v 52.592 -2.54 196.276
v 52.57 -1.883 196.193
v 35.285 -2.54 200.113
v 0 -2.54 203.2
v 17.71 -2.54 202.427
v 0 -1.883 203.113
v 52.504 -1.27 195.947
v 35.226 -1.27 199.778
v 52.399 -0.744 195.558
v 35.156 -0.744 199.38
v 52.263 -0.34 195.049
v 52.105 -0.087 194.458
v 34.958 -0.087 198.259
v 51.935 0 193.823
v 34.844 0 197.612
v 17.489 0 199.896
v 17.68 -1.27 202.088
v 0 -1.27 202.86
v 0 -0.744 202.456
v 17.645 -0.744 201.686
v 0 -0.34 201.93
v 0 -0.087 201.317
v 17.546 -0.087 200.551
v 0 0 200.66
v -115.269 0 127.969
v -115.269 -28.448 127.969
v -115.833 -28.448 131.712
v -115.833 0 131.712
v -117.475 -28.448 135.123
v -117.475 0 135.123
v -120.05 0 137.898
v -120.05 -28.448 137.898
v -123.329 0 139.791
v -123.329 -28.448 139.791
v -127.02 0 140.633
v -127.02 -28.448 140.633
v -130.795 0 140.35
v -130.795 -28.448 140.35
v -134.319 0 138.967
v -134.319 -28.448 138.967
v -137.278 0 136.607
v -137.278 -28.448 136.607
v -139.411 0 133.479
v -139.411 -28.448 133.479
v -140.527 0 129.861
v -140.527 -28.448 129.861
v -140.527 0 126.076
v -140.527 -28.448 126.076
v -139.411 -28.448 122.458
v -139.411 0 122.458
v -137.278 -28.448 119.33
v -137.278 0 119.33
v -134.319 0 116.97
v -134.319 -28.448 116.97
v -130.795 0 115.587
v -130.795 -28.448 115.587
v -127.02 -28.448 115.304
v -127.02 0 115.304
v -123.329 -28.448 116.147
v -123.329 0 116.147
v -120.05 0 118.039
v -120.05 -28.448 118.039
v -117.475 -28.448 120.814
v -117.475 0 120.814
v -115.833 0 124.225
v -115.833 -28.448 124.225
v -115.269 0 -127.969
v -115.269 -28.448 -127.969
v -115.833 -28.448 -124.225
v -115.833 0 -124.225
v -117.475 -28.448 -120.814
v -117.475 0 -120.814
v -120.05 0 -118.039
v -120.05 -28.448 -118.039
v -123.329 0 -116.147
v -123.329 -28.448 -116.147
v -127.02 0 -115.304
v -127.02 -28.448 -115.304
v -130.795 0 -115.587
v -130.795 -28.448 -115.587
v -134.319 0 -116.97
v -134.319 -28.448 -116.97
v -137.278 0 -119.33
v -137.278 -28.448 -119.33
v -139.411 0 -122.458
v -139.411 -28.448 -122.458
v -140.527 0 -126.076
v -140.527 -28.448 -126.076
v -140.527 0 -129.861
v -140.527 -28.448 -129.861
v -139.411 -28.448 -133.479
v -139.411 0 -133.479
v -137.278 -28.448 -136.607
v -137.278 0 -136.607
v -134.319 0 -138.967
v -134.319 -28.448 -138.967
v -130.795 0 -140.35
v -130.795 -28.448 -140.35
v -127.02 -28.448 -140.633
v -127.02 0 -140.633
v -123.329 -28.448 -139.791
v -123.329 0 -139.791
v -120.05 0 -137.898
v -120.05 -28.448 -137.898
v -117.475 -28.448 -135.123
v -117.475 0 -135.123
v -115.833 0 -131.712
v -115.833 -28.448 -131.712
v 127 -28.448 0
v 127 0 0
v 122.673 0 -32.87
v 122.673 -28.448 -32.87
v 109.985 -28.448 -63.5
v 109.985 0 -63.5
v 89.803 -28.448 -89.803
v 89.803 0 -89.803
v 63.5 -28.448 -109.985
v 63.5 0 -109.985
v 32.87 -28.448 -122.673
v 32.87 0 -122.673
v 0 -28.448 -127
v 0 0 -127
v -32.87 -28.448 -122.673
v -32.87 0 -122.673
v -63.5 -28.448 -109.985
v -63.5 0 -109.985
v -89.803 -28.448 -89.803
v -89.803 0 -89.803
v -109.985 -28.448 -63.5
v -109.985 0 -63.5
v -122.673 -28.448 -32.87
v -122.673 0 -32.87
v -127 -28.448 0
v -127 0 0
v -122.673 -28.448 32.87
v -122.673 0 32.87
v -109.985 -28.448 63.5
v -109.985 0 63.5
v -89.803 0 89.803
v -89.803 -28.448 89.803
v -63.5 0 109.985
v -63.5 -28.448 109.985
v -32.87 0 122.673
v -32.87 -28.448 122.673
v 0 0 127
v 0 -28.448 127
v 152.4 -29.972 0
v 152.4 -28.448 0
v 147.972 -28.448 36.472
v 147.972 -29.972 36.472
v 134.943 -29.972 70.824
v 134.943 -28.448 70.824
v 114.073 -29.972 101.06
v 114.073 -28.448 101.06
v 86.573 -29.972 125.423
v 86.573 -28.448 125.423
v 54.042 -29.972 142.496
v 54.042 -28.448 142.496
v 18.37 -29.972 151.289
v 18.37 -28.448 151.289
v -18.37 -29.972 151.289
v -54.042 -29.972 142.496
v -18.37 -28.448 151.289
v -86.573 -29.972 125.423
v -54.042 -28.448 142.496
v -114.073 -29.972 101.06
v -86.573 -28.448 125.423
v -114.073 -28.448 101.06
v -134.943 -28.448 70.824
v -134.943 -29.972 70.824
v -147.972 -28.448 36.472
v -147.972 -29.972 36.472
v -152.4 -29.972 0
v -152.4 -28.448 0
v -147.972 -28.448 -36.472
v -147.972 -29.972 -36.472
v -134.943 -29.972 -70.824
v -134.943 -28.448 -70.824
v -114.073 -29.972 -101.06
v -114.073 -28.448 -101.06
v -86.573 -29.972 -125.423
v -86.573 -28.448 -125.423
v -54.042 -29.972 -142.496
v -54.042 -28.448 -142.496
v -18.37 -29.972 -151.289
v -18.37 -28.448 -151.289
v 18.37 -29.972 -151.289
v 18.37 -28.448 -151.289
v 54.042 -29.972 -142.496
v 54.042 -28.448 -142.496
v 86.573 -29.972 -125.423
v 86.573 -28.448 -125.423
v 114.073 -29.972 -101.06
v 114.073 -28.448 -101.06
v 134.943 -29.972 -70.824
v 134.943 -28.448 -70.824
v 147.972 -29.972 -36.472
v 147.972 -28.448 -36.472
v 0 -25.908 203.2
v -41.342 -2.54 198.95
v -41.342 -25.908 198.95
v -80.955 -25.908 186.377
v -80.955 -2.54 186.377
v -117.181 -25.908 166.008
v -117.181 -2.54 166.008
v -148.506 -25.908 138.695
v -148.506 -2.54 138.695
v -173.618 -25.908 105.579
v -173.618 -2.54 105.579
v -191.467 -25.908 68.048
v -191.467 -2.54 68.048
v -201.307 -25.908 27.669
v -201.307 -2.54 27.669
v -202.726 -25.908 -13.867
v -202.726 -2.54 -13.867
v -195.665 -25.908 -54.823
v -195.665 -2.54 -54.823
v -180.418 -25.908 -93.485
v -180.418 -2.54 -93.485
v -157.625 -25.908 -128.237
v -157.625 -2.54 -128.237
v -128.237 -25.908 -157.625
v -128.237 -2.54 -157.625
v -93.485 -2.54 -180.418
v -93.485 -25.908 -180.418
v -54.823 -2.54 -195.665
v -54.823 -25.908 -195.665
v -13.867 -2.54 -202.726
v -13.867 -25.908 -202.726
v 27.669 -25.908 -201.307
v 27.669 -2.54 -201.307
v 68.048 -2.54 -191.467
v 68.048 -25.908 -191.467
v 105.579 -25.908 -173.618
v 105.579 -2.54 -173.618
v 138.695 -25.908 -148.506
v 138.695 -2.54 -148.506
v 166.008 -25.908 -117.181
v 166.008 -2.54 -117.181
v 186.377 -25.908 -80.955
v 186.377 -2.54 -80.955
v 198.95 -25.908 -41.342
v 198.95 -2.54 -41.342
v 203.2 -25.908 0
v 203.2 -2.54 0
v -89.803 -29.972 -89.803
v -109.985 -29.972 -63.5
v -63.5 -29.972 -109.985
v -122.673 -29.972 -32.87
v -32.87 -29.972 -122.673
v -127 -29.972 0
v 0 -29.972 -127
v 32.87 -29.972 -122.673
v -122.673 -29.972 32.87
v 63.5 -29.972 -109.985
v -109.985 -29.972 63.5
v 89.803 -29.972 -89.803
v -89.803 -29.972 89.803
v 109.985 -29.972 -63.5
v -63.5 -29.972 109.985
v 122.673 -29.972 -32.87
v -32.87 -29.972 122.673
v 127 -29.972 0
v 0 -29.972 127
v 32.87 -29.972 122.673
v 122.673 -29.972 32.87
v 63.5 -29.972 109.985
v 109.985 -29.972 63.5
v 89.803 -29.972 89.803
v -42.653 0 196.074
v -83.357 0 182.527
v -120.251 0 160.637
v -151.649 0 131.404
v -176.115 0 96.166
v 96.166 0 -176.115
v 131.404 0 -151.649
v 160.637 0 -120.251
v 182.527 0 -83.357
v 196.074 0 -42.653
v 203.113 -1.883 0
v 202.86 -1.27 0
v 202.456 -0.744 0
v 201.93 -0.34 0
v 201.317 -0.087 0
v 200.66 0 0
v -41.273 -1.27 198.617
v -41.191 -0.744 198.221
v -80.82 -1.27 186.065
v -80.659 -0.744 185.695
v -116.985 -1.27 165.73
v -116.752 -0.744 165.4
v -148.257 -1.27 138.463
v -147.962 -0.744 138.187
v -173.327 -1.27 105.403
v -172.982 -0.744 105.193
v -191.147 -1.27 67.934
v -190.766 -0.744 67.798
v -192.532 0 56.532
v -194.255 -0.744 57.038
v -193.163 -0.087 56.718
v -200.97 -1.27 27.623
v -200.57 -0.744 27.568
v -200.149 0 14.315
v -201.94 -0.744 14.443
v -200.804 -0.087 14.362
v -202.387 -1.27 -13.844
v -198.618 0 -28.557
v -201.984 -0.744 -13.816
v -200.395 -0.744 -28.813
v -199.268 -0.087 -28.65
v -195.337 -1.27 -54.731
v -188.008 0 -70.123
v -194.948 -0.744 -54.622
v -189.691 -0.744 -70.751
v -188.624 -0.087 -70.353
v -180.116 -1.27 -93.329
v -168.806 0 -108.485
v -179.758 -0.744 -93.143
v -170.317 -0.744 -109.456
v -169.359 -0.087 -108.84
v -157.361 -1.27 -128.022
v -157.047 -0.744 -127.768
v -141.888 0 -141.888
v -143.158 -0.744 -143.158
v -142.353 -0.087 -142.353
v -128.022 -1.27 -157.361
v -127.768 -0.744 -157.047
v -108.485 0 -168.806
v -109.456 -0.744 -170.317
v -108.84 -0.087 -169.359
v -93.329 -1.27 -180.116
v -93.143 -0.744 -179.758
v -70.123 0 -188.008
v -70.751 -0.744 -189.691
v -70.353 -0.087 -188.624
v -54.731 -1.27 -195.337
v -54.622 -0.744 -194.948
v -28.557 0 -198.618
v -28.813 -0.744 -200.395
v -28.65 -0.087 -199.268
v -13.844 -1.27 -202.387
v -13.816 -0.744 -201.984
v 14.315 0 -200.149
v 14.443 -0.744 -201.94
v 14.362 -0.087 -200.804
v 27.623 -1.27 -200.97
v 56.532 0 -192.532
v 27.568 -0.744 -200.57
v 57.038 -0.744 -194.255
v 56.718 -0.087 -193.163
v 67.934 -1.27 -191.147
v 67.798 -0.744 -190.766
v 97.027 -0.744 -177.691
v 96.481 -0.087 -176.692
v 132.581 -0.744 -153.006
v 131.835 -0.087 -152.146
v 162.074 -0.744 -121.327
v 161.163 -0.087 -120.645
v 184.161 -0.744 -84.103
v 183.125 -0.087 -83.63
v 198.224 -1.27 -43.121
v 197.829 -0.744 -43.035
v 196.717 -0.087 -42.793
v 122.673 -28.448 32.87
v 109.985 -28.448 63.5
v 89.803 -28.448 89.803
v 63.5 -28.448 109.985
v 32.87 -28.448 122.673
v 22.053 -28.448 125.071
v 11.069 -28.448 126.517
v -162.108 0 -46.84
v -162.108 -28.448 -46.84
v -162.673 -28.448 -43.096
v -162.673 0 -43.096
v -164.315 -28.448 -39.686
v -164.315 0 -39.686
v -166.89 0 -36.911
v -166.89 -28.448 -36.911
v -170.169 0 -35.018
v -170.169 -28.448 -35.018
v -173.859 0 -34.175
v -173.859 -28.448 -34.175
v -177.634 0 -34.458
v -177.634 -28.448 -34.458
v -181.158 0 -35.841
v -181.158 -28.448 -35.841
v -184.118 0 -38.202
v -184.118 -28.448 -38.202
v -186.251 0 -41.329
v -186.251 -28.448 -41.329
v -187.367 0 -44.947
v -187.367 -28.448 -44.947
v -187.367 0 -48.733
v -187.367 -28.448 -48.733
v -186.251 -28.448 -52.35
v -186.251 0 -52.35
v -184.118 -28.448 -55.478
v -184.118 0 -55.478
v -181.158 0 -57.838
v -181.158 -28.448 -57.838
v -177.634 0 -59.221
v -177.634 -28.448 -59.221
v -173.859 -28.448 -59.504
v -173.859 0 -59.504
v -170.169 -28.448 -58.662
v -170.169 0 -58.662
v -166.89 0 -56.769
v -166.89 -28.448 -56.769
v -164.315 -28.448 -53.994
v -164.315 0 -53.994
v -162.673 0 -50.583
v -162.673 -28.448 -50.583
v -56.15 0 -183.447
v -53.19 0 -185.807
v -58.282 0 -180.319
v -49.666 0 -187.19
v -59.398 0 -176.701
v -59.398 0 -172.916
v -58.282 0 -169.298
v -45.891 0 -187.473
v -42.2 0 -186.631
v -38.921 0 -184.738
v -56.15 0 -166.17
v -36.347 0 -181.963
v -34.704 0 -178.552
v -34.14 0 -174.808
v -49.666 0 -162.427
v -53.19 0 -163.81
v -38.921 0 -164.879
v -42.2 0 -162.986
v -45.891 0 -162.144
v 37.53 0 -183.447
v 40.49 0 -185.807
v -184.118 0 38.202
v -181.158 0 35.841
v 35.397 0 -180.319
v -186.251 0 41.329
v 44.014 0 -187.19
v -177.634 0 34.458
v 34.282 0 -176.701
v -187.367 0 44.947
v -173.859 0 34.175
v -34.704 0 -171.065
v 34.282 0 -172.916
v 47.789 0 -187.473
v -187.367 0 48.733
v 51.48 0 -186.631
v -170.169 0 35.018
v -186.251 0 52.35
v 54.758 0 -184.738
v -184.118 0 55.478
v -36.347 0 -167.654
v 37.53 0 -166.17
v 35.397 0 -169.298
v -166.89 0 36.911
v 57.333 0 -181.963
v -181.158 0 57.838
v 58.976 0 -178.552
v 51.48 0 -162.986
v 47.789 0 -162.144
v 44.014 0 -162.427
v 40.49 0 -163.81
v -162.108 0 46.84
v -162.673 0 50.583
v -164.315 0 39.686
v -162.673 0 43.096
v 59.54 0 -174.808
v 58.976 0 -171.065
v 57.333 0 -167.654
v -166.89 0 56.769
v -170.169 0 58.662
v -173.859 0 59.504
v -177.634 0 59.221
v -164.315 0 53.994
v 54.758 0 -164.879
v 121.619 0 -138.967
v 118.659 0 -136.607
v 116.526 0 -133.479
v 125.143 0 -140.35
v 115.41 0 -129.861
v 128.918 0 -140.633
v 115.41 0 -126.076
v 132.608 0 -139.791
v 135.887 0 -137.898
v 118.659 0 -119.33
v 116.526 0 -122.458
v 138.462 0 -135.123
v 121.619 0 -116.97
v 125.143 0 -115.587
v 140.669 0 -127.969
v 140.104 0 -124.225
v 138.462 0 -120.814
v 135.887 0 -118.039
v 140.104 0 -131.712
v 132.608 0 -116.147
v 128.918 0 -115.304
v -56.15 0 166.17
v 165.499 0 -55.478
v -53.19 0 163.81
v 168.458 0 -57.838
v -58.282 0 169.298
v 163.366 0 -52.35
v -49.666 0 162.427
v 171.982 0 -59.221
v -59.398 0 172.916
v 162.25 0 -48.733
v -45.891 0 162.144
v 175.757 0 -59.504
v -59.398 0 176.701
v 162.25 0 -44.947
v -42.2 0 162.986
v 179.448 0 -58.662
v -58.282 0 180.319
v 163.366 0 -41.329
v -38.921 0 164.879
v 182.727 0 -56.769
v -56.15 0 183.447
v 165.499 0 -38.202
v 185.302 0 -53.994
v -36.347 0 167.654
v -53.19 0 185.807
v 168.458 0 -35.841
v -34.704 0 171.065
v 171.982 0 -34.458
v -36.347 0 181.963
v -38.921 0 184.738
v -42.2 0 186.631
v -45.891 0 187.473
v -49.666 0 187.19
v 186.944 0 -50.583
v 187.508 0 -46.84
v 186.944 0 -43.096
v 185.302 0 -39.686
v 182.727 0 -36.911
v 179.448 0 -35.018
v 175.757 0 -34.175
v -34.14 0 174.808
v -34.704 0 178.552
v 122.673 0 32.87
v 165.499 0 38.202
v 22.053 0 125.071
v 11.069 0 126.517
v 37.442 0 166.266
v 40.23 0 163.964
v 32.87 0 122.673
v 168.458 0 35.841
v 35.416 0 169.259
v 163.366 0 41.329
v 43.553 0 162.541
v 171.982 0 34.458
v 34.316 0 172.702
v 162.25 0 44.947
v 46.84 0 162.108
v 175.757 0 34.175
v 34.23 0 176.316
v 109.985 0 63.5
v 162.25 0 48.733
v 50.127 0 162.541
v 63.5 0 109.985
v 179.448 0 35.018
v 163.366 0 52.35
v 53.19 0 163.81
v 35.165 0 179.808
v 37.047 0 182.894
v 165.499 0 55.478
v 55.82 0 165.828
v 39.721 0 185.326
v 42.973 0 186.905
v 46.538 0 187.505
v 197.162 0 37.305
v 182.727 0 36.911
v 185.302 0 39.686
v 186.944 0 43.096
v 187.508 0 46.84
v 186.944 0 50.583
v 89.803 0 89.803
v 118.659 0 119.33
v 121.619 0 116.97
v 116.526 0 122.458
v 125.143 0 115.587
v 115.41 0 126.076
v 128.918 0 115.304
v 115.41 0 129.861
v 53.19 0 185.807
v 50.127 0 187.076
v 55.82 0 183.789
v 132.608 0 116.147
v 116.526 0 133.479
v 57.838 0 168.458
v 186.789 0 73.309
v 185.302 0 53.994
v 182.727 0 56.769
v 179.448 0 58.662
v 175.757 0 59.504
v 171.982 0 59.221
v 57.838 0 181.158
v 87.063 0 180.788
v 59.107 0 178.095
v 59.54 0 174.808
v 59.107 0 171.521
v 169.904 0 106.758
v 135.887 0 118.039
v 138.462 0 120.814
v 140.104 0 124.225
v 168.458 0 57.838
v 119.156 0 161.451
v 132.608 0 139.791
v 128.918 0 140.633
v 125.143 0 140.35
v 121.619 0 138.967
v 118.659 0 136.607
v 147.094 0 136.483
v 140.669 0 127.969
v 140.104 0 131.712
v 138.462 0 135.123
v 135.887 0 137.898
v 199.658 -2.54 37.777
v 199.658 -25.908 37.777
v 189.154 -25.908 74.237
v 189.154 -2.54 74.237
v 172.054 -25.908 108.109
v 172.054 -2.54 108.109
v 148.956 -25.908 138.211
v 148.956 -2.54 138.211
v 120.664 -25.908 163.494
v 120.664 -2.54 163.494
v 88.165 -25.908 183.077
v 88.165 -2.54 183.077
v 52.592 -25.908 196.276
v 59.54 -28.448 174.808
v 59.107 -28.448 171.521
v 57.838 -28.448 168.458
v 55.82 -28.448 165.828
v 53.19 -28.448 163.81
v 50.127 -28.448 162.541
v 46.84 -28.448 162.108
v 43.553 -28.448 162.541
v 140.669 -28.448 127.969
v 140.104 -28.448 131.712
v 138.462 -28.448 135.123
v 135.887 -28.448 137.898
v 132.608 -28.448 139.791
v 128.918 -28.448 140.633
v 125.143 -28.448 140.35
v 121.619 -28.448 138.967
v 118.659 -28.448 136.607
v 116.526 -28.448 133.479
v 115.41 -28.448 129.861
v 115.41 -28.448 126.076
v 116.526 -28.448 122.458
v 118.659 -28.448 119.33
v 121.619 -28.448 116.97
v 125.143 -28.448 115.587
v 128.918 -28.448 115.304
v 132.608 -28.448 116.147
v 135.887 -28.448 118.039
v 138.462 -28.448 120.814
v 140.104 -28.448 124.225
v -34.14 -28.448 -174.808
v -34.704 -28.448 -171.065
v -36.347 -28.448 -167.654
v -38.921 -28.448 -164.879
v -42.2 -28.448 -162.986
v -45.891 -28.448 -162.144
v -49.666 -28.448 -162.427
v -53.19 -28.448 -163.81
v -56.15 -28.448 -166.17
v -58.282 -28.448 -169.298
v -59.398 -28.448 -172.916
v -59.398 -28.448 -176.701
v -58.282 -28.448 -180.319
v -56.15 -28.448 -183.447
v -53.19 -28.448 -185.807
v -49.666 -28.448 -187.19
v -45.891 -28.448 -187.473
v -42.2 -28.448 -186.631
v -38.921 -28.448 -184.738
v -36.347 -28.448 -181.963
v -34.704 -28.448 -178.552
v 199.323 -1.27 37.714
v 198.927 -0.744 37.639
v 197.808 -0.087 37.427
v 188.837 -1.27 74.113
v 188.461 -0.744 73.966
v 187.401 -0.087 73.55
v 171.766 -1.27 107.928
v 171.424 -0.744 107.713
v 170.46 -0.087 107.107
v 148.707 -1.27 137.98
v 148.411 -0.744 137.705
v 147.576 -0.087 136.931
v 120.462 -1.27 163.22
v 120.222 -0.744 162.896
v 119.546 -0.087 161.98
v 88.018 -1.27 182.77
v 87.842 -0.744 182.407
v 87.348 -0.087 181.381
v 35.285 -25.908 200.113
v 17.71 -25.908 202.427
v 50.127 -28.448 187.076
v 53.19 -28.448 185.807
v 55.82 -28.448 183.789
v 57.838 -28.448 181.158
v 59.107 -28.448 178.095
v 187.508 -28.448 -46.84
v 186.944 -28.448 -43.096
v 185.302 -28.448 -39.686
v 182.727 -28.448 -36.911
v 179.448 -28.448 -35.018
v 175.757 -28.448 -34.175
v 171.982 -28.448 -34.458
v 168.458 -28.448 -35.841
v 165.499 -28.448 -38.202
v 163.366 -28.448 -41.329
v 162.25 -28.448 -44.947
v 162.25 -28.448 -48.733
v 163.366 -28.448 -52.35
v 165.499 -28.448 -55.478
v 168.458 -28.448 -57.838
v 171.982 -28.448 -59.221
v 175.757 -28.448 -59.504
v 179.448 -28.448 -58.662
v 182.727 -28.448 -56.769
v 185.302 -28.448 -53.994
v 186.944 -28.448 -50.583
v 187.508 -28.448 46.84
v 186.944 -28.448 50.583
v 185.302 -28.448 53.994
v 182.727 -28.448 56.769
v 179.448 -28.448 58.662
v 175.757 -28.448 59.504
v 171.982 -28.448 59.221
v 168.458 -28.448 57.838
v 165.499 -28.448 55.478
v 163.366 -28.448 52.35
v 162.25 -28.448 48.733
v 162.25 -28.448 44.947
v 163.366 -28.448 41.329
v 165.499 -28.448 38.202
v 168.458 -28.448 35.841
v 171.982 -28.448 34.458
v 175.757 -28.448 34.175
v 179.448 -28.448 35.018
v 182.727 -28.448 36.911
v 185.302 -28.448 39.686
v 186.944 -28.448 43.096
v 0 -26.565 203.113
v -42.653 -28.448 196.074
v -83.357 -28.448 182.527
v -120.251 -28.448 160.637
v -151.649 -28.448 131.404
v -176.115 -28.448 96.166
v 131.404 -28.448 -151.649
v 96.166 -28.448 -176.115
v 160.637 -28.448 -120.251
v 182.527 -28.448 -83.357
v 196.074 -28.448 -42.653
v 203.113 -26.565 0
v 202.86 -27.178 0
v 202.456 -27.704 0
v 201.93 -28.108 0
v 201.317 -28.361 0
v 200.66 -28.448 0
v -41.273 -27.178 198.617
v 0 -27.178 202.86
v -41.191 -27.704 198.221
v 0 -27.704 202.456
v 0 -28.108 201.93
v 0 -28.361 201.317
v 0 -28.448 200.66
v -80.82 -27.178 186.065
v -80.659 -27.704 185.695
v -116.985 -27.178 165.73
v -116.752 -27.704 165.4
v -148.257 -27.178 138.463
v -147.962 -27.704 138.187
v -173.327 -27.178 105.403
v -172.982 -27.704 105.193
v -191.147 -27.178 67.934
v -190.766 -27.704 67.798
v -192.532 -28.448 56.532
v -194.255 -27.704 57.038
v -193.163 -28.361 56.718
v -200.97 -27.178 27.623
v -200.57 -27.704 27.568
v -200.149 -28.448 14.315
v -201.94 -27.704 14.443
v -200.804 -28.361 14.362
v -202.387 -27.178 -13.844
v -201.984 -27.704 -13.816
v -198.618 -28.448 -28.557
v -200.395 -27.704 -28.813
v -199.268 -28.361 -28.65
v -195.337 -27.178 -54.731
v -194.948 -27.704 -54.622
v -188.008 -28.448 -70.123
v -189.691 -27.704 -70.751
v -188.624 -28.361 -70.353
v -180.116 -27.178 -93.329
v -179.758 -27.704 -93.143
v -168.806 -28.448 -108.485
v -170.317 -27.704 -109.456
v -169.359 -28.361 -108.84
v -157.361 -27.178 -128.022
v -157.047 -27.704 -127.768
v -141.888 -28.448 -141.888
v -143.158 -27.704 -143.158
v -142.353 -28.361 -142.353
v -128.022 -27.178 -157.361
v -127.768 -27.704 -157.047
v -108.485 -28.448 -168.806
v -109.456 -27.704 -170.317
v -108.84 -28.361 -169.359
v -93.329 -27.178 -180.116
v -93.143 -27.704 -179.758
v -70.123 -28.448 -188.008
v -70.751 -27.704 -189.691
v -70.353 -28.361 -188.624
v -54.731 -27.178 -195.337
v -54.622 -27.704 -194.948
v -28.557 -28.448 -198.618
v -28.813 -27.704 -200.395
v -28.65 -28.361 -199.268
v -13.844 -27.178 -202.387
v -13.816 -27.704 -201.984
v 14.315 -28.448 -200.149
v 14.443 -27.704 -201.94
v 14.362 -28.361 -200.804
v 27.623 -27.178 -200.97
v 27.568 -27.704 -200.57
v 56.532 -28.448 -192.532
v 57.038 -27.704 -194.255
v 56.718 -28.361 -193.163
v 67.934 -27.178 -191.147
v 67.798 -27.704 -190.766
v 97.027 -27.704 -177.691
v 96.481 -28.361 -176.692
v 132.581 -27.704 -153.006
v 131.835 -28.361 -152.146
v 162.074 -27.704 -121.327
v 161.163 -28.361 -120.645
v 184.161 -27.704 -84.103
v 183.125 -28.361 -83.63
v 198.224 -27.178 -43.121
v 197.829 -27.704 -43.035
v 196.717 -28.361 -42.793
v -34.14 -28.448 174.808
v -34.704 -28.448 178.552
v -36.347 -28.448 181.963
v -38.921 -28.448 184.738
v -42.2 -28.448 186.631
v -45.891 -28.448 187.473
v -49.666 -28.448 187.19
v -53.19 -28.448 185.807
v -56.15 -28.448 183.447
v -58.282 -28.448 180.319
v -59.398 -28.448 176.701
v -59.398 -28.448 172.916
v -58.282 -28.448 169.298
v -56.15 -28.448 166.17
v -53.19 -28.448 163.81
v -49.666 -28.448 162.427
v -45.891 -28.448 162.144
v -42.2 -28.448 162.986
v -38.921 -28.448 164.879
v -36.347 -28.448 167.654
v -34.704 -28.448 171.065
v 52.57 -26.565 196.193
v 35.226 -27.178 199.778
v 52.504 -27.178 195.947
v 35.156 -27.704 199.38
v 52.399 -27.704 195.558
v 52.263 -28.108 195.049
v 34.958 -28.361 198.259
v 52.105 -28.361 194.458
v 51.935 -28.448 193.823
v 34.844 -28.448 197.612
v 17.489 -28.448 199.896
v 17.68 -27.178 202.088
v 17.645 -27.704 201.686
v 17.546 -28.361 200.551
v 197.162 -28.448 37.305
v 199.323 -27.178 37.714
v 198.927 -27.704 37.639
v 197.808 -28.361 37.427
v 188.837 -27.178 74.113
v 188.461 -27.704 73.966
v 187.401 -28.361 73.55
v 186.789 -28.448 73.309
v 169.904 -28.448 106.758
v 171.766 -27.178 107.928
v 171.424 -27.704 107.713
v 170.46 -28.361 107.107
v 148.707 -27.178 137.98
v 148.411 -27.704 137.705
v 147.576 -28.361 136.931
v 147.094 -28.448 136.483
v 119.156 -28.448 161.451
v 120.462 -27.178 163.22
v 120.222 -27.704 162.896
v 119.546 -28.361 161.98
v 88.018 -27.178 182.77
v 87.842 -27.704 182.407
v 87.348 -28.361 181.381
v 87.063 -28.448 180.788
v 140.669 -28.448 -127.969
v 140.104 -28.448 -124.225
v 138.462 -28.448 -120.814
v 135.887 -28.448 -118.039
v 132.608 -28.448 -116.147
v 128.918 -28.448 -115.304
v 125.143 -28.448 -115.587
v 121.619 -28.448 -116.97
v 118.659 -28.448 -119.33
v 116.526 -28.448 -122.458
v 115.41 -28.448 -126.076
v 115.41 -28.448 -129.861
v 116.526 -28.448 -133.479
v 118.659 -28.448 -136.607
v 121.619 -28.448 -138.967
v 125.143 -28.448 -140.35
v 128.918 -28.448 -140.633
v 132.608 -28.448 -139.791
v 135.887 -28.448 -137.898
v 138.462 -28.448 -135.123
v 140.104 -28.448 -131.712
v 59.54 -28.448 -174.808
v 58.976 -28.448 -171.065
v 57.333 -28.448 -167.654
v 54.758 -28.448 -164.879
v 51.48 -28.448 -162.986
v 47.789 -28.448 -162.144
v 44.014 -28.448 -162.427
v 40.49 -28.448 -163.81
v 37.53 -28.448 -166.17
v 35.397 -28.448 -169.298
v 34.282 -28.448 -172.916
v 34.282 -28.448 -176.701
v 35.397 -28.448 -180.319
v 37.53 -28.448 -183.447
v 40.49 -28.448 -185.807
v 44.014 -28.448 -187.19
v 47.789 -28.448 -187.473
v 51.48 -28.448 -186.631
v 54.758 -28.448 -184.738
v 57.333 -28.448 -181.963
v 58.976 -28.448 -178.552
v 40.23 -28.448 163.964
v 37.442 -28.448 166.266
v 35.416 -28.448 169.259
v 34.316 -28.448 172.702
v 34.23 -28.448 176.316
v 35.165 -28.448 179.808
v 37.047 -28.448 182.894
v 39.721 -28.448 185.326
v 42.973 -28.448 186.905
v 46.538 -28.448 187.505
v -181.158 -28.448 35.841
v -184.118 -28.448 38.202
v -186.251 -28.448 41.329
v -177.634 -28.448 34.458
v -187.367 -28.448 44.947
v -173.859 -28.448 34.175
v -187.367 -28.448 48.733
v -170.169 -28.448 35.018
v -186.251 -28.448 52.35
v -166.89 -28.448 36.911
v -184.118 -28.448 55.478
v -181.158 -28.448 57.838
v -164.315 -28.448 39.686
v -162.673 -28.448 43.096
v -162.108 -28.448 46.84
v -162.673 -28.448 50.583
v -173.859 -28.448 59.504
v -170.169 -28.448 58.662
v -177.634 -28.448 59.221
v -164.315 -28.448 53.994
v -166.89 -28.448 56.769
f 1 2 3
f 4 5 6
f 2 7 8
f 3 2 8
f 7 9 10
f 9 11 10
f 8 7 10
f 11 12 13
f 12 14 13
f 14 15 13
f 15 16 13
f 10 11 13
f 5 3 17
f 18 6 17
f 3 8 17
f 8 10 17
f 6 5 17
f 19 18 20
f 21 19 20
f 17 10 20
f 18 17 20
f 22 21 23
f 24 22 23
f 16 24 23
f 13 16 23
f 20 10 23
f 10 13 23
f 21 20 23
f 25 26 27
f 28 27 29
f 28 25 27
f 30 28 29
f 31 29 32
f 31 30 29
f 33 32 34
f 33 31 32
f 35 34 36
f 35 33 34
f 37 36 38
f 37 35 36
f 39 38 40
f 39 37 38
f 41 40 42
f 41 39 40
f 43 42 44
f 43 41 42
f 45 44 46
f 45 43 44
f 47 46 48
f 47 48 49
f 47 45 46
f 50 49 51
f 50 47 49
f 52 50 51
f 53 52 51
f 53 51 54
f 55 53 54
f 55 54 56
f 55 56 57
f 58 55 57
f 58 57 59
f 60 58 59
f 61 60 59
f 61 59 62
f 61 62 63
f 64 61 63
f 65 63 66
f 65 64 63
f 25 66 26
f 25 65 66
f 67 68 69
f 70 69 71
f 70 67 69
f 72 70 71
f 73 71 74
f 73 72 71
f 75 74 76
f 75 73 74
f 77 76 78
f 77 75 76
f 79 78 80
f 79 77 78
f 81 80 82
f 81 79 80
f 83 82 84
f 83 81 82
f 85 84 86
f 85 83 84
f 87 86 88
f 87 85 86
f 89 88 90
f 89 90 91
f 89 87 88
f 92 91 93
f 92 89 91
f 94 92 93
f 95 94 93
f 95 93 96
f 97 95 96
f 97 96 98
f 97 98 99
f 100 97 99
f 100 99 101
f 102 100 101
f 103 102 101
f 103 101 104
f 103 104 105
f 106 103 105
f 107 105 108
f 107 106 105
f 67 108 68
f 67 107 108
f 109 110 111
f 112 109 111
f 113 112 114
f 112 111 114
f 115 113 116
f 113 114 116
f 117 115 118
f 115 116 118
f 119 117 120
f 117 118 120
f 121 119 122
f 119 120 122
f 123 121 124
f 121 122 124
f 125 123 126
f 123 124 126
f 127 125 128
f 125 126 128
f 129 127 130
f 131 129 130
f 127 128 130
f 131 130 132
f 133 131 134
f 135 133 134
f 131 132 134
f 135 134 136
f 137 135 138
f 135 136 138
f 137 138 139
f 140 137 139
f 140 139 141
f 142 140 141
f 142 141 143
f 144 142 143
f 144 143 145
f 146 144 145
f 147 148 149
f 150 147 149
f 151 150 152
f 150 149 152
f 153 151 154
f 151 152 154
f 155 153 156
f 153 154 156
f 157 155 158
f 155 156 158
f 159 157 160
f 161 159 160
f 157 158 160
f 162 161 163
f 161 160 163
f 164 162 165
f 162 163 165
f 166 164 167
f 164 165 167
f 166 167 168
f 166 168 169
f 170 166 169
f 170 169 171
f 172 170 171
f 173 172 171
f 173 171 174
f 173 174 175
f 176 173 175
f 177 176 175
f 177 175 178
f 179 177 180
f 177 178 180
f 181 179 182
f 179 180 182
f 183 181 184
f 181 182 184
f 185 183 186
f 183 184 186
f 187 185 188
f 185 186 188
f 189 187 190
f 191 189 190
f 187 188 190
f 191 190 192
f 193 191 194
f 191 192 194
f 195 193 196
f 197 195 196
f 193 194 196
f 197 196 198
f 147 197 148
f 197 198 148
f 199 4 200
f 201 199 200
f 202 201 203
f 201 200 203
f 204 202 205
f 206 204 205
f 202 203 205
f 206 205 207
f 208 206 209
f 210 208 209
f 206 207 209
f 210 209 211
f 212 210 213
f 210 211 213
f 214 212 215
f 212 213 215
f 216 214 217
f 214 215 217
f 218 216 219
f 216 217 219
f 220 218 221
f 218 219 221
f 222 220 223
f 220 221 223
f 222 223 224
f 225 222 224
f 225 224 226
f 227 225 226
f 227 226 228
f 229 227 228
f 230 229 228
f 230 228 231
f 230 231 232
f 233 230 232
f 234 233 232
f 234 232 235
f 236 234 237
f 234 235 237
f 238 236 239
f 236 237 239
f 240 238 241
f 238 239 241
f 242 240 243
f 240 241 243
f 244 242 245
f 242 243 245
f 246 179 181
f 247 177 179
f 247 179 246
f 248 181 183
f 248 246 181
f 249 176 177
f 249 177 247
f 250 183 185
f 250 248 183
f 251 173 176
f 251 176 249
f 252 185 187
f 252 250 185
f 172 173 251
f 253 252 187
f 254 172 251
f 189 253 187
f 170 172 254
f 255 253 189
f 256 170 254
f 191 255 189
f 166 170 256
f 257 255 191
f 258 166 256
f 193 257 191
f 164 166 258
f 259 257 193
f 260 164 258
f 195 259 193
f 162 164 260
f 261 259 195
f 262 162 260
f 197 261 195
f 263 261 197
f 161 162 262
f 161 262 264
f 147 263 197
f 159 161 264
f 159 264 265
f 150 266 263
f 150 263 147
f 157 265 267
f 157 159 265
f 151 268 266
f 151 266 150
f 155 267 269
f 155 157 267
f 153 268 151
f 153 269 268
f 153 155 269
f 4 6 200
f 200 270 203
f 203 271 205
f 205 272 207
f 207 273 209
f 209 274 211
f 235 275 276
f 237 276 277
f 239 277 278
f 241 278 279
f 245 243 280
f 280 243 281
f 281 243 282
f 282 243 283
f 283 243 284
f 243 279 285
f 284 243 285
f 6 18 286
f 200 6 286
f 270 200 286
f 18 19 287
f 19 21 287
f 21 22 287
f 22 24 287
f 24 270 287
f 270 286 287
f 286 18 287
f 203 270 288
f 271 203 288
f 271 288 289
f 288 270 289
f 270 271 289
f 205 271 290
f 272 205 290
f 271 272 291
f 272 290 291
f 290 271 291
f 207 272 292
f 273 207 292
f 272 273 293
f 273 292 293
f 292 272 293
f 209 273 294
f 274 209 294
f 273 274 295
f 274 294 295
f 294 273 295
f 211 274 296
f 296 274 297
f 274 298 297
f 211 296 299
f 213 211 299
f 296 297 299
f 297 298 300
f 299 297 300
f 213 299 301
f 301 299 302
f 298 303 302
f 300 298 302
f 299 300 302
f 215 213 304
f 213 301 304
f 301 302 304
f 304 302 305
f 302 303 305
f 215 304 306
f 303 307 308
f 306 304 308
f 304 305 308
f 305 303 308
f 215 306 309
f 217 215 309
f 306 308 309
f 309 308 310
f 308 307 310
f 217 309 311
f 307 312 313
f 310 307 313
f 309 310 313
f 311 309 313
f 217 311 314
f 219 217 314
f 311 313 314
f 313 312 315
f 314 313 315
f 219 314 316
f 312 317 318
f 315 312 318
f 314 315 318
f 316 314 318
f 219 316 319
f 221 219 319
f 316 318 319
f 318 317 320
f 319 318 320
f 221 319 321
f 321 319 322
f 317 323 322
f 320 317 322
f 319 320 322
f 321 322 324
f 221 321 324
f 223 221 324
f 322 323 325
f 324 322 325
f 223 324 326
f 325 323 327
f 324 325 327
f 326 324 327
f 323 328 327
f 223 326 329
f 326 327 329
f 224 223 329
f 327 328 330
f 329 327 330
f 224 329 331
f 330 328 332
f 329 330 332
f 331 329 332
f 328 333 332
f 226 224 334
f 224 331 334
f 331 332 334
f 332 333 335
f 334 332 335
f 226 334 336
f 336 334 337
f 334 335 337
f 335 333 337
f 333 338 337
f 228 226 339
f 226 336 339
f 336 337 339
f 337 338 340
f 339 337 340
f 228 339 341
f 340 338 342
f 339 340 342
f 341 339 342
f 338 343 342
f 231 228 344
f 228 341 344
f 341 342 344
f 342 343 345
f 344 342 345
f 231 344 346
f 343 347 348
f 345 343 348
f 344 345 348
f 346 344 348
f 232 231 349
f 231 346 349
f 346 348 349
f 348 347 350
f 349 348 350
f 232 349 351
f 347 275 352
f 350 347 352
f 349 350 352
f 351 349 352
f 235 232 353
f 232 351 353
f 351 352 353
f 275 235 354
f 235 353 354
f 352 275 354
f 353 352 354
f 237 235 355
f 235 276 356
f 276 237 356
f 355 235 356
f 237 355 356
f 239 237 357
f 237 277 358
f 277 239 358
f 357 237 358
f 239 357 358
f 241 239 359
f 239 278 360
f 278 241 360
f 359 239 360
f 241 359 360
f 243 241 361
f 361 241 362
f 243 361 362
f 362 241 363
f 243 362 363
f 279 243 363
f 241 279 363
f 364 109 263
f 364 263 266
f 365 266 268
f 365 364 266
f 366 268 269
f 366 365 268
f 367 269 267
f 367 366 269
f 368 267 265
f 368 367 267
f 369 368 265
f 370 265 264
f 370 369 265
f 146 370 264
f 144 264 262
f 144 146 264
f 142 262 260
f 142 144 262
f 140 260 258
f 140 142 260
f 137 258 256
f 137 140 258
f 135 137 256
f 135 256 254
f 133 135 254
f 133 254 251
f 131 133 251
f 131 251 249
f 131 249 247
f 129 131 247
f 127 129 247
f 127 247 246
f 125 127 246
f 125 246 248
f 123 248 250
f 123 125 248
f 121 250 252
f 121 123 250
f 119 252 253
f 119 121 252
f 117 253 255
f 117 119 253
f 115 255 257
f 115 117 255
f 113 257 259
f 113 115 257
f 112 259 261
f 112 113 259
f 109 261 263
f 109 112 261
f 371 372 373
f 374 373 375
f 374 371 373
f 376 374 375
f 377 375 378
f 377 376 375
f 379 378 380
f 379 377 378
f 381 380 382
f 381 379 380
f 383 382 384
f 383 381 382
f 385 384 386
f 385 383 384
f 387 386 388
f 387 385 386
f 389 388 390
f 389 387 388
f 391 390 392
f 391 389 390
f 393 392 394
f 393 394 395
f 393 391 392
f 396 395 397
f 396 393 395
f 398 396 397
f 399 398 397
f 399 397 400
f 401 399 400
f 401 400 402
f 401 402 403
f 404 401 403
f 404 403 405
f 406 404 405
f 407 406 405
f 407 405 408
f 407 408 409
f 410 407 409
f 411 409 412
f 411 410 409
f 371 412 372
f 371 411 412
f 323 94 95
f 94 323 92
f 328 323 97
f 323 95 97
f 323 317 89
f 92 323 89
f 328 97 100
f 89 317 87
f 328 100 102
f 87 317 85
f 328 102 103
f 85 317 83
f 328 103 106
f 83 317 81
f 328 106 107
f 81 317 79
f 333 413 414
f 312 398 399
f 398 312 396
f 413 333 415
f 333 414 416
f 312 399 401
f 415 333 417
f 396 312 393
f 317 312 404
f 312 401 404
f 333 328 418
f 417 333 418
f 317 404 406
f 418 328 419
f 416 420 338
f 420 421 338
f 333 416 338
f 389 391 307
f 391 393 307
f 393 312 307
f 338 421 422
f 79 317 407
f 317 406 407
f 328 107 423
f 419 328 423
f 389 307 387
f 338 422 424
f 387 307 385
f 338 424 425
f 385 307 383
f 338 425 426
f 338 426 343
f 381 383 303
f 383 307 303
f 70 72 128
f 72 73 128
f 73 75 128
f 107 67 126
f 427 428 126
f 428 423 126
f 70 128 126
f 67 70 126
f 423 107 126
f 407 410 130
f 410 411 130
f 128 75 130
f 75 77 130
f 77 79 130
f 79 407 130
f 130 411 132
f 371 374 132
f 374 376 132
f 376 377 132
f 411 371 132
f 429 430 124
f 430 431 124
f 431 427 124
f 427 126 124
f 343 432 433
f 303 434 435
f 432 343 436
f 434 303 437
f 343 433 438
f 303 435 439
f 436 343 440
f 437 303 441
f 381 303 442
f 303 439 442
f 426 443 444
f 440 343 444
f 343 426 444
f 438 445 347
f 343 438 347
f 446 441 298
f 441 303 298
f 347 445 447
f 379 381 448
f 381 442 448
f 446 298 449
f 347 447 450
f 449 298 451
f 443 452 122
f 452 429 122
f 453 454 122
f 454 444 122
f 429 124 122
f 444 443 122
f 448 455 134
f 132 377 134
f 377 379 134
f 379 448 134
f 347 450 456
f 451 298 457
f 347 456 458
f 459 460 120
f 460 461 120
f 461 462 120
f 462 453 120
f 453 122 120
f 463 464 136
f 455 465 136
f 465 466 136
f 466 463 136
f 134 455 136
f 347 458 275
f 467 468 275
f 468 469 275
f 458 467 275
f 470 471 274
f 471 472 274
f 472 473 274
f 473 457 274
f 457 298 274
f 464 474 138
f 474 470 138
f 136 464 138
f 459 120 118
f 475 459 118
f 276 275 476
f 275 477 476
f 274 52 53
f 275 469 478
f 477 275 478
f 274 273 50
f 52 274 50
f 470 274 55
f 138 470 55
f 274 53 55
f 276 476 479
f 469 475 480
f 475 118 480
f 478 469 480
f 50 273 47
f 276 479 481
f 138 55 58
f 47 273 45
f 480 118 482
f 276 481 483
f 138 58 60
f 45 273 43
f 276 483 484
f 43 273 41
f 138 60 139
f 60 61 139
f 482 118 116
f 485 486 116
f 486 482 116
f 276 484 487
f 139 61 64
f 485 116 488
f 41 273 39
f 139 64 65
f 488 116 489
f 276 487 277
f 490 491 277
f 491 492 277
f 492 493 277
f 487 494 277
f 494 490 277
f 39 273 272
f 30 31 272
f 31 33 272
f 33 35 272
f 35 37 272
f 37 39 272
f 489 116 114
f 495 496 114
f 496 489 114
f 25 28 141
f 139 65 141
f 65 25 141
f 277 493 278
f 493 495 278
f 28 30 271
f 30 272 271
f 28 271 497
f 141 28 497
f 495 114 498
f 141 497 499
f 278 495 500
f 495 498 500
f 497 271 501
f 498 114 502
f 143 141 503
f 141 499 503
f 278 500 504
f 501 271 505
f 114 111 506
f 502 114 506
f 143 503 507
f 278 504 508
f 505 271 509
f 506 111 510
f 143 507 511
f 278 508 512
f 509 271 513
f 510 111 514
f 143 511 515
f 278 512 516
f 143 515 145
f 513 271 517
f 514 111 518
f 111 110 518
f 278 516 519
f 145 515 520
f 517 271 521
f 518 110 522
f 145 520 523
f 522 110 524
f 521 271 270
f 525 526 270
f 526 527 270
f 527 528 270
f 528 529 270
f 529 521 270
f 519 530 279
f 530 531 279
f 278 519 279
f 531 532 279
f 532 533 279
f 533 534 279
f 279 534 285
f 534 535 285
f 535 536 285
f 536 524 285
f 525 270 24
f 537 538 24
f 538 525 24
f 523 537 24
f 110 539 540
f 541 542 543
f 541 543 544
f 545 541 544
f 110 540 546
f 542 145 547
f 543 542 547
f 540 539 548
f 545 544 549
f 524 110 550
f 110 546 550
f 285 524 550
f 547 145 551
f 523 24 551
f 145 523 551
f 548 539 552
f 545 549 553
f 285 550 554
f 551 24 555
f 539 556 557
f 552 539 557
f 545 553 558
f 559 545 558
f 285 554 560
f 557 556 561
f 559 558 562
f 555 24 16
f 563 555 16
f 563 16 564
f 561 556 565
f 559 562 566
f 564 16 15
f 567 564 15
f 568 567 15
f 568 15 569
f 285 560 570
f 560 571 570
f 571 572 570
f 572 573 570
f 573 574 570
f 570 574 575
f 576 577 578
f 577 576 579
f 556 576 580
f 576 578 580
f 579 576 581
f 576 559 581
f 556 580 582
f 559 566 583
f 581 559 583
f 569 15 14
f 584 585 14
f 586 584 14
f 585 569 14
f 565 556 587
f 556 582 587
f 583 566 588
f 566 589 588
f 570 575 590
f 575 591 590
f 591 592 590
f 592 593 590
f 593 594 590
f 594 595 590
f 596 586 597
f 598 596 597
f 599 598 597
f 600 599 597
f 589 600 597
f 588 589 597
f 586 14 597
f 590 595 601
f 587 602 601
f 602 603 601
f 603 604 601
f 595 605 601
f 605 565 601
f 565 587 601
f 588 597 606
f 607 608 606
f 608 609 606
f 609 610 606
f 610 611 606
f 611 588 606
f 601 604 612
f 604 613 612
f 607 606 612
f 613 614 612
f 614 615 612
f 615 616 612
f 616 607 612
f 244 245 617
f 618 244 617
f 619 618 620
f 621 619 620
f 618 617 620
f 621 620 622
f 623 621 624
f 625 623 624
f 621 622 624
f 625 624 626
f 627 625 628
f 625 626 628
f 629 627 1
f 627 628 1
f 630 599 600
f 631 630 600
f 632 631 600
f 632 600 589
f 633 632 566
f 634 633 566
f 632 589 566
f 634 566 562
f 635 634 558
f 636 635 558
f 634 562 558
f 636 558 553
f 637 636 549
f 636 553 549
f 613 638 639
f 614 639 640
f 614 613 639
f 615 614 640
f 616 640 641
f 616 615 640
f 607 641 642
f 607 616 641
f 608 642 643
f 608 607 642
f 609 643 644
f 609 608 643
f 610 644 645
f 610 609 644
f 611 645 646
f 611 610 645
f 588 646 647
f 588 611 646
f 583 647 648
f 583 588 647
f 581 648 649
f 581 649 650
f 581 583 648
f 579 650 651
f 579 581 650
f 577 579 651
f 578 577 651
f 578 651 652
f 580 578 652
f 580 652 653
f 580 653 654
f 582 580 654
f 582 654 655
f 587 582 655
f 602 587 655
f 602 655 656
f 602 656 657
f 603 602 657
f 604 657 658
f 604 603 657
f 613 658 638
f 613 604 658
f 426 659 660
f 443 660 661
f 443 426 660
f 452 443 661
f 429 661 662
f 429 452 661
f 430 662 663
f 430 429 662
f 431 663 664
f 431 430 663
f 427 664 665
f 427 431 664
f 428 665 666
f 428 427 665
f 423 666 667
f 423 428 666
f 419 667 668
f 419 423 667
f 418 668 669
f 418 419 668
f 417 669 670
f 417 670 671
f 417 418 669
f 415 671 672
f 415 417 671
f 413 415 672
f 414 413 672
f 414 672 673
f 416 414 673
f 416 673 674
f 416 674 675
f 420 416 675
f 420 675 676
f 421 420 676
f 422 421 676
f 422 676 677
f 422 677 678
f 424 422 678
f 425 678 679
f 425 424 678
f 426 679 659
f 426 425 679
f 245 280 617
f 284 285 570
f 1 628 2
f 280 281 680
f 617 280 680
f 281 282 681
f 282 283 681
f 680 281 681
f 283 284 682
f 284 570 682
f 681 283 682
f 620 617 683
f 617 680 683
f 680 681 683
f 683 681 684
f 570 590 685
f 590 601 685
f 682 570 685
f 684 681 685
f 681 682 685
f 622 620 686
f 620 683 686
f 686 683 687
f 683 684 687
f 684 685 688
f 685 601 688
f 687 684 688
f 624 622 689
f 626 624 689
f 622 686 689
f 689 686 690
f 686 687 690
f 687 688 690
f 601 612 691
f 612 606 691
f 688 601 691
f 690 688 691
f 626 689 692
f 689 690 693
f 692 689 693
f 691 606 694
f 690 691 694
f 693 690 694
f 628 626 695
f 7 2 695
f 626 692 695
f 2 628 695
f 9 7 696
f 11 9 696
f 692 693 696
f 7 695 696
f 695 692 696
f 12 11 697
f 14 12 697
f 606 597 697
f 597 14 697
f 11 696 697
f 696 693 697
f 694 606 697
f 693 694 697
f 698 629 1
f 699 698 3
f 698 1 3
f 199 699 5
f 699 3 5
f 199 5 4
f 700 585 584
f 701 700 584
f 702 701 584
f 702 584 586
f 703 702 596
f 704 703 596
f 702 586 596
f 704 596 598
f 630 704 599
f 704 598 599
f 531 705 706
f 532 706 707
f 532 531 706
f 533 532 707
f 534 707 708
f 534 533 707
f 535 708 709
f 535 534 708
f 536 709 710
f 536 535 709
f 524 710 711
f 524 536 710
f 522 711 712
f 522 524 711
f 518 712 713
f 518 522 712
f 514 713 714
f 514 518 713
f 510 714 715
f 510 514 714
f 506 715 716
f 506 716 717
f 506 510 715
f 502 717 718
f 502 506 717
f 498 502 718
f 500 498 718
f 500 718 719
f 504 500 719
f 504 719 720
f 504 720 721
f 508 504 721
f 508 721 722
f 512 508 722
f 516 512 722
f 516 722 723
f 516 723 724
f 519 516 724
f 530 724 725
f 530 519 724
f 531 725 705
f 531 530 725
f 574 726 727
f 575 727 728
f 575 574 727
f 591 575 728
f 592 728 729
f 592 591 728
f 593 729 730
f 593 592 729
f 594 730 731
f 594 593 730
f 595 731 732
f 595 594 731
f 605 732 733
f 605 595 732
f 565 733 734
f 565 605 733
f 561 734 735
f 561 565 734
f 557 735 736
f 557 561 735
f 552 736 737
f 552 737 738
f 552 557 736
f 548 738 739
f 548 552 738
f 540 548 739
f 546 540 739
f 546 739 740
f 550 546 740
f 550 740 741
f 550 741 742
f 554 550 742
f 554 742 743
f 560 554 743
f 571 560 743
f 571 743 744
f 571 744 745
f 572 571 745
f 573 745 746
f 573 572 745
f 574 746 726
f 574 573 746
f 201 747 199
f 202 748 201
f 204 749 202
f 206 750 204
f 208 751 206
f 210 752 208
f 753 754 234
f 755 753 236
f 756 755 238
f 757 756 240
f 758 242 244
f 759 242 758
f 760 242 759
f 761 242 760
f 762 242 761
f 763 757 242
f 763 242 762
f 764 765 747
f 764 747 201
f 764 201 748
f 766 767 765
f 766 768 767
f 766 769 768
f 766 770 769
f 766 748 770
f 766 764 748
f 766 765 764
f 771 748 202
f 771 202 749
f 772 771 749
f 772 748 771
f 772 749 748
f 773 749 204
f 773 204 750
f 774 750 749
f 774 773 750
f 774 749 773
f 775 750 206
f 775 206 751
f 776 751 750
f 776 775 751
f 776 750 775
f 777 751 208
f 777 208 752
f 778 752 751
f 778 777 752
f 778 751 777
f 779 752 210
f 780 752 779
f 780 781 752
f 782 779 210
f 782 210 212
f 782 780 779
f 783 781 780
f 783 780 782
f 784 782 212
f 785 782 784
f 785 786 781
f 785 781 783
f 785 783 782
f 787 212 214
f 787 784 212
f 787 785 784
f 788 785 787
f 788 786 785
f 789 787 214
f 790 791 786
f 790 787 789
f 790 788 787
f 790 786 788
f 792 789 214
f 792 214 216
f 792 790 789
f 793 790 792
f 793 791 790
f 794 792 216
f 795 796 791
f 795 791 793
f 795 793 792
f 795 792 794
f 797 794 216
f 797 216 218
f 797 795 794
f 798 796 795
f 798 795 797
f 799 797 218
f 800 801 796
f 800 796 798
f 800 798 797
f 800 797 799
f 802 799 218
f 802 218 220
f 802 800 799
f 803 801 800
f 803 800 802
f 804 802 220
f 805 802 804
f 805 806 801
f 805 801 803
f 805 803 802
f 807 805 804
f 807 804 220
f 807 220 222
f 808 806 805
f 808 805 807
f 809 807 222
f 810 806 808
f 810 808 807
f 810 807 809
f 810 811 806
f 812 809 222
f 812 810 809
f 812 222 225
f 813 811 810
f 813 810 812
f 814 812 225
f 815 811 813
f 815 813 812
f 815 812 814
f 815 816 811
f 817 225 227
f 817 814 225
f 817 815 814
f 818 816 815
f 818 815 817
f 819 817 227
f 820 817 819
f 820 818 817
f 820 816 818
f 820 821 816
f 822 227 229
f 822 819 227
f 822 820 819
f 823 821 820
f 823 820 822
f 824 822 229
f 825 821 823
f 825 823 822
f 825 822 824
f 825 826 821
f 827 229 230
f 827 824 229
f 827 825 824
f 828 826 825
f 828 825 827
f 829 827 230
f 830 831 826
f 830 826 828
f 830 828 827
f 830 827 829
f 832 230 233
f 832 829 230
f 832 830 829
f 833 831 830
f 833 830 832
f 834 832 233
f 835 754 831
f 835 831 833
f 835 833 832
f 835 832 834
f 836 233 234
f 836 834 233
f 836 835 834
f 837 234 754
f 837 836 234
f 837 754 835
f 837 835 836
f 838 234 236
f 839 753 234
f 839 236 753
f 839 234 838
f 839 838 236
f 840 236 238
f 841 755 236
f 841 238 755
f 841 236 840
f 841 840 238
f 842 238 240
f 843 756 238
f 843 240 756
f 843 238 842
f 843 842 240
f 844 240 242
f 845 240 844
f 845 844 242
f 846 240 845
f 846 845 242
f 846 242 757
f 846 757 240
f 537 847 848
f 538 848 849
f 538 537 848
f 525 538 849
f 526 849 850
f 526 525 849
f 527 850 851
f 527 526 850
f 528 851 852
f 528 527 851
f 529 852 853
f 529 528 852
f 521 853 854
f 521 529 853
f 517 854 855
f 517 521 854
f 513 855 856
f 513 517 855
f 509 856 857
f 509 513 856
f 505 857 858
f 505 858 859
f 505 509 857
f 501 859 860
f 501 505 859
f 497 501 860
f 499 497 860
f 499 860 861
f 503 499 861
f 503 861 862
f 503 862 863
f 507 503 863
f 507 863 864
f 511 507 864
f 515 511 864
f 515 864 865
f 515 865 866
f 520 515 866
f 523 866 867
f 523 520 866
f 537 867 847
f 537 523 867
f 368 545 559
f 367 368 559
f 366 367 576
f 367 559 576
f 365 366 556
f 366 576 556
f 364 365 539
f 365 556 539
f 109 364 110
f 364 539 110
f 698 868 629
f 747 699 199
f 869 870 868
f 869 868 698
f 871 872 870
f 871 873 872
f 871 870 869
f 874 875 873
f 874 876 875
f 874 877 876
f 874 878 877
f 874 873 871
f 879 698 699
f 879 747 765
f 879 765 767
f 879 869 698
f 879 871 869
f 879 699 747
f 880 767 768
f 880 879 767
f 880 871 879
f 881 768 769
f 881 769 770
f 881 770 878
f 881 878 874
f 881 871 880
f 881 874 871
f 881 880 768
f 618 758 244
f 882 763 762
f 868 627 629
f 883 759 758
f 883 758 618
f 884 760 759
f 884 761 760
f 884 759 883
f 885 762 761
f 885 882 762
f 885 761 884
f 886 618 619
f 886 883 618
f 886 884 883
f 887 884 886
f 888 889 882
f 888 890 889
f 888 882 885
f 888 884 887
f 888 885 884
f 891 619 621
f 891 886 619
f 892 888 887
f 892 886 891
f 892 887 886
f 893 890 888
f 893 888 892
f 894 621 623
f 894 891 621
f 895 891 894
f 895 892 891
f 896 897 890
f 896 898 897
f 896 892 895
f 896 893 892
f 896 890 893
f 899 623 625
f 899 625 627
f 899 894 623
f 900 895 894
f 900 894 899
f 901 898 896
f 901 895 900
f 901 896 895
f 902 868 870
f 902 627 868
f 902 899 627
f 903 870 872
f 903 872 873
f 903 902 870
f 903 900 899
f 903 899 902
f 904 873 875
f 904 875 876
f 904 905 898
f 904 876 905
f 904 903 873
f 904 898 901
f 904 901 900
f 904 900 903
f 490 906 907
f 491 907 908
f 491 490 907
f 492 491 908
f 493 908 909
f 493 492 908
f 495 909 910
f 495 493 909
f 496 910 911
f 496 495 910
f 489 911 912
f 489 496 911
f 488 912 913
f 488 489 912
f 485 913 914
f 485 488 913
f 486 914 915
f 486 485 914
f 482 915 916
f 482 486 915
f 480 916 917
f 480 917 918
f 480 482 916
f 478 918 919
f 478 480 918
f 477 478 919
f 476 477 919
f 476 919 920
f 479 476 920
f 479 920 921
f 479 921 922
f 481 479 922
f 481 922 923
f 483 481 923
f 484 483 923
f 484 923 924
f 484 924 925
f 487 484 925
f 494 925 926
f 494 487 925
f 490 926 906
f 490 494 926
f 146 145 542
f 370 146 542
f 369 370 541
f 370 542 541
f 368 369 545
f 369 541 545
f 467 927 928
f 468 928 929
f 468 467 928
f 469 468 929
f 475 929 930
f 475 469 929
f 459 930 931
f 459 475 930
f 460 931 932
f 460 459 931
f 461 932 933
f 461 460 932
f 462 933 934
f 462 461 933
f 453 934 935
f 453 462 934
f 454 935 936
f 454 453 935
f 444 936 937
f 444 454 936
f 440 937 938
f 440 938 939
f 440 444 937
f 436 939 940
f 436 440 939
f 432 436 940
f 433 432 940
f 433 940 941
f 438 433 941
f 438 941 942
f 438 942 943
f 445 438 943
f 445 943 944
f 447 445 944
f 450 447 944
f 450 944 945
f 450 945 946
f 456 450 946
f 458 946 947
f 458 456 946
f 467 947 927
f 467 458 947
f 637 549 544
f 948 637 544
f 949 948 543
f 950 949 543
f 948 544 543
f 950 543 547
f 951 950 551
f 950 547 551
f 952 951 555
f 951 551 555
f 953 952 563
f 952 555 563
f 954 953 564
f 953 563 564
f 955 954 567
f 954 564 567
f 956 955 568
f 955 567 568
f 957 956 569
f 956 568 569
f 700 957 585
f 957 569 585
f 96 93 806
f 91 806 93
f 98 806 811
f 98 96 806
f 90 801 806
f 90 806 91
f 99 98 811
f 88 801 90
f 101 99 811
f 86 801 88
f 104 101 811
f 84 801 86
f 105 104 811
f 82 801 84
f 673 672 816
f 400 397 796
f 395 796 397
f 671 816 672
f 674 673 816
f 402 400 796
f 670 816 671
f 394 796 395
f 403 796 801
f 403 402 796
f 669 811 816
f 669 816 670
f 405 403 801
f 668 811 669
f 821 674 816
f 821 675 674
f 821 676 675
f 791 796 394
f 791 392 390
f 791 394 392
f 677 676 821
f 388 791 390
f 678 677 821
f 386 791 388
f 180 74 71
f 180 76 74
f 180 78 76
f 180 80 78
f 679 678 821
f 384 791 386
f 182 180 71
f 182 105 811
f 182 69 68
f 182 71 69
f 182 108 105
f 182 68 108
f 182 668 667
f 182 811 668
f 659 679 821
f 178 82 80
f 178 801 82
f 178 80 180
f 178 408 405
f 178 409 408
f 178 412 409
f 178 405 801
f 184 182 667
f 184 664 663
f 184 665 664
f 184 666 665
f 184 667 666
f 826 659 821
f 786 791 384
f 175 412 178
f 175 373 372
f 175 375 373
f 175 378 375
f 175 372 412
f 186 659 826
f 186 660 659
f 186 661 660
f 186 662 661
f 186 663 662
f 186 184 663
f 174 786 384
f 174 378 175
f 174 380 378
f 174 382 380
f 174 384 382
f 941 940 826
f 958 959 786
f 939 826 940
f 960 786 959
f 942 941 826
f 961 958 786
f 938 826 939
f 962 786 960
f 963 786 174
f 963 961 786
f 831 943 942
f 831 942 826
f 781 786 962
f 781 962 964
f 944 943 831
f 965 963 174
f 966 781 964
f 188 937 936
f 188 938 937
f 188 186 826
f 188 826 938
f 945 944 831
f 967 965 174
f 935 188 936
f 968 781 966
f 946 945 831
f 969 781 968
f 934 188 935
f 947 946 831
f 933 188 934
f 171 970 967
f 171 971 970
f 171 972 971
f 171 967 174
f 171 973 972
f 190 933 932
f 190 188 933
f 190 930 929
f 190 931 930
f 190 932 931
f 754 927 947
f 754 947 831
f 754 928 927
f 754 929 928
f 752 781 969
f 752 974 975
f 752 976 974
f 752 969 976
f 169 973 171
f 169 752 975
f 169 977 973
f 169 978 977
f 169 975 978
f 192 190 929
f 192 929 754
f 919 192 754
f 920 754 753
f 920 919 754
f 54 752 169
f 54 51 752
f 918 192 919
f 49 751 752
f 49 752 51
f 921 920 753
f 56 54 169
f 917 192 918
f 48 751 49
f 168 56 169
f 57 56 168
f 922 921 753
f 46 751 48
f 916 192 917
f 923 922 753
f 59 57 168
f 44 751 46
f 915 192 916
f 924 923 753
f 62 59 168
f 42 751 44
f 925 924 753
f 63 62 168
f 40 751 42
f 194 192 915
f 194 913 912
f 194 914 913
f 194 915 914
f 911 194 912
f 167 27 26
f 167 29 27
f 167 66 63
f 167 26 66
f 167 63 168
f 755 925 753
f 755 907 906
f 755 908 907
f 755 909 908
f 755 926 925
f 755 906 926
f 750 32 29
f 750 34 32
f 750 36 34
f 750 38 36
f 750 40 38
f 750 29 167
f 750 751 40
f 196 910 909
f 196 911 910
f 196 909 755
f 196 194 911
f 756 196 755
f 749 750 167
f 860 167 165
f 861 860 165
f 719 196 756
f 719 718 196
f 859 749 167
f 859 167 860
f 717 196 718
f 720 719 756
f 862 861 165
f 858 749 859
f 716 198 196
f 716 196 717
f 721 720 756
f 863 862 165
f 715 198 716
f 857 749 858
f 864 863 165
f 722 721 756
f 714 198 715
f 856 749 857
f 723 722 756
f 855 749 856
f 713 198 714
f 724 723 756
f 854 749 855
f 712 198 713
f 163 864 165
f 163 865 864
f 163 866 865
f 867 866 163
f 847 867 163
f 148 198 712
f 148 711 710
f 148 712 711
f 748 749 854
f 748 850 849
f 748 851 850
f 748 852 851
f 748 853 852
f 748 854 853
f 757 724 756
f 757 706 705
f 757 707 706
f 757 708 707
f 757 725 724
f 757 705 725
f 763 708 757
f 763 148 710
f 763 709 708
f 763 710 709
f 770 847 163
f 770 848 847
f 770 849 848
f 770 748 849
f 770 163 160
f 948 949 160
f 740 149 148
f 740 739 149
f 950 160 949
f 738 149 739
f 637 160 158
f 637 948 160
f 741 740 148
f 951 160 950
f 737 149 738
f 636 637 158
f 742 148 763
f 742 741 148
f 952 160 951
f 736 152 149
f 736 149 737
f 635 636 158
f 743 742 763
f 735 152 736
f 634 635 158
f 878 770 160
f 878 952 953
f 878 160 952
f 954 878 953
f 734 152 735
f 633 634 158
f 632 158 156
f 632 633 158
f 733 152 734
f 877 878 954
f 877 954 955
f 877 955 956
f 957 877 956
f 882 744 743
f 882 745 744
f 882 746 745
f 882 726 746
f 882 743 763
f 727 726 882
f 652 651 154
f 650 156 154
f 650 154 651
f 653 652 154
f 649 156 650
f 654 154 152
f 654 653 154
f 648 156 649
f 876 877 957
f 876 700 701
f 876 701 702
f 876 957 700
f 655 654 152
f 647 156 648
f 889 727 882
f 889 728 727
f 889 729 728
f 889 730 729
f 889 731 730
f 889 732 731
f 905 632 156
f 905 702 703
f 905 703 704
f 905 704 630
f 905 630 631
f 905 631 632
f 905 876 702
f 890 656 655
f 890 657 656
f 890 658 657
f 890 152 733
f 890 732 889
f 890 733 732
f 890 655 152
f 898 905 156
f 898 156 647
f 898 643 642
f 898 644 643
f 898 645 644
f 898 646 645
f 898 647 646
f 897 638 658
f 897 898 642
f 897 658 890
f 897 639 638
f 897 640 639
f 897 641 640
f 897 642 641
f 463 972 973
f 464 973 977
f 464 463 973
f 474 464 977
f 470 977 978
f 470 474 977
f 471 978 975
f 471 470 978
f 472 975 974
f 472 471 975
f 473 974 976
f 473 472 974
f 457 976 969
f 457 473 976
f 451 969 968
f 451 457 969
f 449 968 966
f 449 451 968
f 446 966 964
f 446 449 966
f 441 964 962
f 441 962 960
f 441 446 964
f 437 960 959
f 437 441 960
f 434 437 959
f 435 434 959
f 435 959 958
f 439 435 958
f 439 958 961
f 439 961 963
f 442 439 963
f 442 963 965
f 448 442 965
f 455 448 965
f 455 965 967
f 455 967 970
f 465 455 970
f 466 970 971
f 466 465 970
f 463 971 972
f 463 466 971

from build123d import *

# Parameters (mm, degrees)
F0_R     = 12.7
F1_DEPTH = 28.448
F2_R     = 2.54
F3_R     = 152.4
F3_R_2   = 127
F4_DEPTH = 1.524


with BuildPart() as f1:
    # F0 (on Front) → F1 (new body)
    with BuildSketch(Plane.XZ):
        with BuildLine():
            ThreePointArc((0, 203.2), (-143.684098, -143.684098), (203.2, 0))
            ThreePointArc((203.2, 0), (161.209399, 123.700322), (52.59203, 196.276128))
            Line((52.59203, 196.276128), (50.126779, 187.075684))
            ThreePointArc((50.126779, 187.075684), (56.915364, 182.539697), (59.539777, 174.808426))
            ThreePointArc((59.539777, 174.808426), (54.571047, 164.732839), (43.552775, 162.541168))
            Line((43.552775, 162.541168), (32.870019, 122.67258))
            ThreePointArc((32.870019, 122.67258), (100.755874, 77.312701), (127, 0))
            ThreePointArc((127, 0), (-89.802561, -89.802561), (0, 127))
            Line((0, 127), (0, 203.2))
        make_face()
        with Locations((-127.96865, -127.96865)):
            Circle(F0_R, mode=Mode.SUBTRACT)
        with Locations((-46.839777, -174.808426)):
            Circle(F0_R, mode=Mode.SUBTRACT)
        with Locations((-174.808426, -46.839777)):
            Circle(F0_R, mode=Mode.SUBTRACT)
        with Locations((46.839777, -174.808426)):
            Circle(F0_R, mode=Mode.SUBTRACT)
        with Locations((127.96865, -127.96865)):
            Circle(F0_R, mode=Mode.SUBTRACT)
        with Locations((174.808426, -46.839777)):
            Circle(F0_R, mode=Mode.SUBTRACT)
        with Locations((-174.808426, 46.839777)):
            Circle(F0_R, mode=Mode.SUBTRACT)
        with Locations((-127.96865, 127.96865)):
            Circle(F0_R, mode=Mode.SUBTRACT)
        with Locations((-46.839777, 174.808426)):
            Circle(F0_R, mode=Mode.SUBTRACT)
        with Locations((174.808426, 46.839777)):
            Circle(F0_R, mode=Mode.SUBTRACT)
        with Locations((127.96865, 127.96865)):
            Circle(F0_R, mode=Mode.SUBTRACT)
        with BuildLine():
            Line((50.126779, 187.075684), (52.59203, 196.276128))
            ThreePointArc((52.59203, 196.276128), (26.522922, 201.461596), (0, 203.2))
            Line((0, 203.2), (0, 127))
            ThreePointArc((0, 127), (16.576826, 125.913497), (32.870019, 122.67258))
            Line((32.870019, 122.67258), (43.552775, 162.541168))
            ThreePointArc((43.552775, 162.541168), (34.572519, 178.095428), (50.126779, 187.075684))
        make_face()
    extrude(amount=F1_DEPTH)

    # F2
    f2_edges = [f1.edges().sort_by_distance(p)[0] for p in [
        (-203.2, -28.448, 0),
        (-203.2, 0, 0),
    ]]
    fillet(f2_edges, radius=F2_R)

    # F3 (on face) → F4 (join)
    with BuildSketch(Plane.XZ.offset(28.448)):
        Circle(F3_R)
        Circle(F3_R_2, mode=Mode.SUBTRACT)
    extrude(amount=F4_DEPTH)


solid = f1.part
